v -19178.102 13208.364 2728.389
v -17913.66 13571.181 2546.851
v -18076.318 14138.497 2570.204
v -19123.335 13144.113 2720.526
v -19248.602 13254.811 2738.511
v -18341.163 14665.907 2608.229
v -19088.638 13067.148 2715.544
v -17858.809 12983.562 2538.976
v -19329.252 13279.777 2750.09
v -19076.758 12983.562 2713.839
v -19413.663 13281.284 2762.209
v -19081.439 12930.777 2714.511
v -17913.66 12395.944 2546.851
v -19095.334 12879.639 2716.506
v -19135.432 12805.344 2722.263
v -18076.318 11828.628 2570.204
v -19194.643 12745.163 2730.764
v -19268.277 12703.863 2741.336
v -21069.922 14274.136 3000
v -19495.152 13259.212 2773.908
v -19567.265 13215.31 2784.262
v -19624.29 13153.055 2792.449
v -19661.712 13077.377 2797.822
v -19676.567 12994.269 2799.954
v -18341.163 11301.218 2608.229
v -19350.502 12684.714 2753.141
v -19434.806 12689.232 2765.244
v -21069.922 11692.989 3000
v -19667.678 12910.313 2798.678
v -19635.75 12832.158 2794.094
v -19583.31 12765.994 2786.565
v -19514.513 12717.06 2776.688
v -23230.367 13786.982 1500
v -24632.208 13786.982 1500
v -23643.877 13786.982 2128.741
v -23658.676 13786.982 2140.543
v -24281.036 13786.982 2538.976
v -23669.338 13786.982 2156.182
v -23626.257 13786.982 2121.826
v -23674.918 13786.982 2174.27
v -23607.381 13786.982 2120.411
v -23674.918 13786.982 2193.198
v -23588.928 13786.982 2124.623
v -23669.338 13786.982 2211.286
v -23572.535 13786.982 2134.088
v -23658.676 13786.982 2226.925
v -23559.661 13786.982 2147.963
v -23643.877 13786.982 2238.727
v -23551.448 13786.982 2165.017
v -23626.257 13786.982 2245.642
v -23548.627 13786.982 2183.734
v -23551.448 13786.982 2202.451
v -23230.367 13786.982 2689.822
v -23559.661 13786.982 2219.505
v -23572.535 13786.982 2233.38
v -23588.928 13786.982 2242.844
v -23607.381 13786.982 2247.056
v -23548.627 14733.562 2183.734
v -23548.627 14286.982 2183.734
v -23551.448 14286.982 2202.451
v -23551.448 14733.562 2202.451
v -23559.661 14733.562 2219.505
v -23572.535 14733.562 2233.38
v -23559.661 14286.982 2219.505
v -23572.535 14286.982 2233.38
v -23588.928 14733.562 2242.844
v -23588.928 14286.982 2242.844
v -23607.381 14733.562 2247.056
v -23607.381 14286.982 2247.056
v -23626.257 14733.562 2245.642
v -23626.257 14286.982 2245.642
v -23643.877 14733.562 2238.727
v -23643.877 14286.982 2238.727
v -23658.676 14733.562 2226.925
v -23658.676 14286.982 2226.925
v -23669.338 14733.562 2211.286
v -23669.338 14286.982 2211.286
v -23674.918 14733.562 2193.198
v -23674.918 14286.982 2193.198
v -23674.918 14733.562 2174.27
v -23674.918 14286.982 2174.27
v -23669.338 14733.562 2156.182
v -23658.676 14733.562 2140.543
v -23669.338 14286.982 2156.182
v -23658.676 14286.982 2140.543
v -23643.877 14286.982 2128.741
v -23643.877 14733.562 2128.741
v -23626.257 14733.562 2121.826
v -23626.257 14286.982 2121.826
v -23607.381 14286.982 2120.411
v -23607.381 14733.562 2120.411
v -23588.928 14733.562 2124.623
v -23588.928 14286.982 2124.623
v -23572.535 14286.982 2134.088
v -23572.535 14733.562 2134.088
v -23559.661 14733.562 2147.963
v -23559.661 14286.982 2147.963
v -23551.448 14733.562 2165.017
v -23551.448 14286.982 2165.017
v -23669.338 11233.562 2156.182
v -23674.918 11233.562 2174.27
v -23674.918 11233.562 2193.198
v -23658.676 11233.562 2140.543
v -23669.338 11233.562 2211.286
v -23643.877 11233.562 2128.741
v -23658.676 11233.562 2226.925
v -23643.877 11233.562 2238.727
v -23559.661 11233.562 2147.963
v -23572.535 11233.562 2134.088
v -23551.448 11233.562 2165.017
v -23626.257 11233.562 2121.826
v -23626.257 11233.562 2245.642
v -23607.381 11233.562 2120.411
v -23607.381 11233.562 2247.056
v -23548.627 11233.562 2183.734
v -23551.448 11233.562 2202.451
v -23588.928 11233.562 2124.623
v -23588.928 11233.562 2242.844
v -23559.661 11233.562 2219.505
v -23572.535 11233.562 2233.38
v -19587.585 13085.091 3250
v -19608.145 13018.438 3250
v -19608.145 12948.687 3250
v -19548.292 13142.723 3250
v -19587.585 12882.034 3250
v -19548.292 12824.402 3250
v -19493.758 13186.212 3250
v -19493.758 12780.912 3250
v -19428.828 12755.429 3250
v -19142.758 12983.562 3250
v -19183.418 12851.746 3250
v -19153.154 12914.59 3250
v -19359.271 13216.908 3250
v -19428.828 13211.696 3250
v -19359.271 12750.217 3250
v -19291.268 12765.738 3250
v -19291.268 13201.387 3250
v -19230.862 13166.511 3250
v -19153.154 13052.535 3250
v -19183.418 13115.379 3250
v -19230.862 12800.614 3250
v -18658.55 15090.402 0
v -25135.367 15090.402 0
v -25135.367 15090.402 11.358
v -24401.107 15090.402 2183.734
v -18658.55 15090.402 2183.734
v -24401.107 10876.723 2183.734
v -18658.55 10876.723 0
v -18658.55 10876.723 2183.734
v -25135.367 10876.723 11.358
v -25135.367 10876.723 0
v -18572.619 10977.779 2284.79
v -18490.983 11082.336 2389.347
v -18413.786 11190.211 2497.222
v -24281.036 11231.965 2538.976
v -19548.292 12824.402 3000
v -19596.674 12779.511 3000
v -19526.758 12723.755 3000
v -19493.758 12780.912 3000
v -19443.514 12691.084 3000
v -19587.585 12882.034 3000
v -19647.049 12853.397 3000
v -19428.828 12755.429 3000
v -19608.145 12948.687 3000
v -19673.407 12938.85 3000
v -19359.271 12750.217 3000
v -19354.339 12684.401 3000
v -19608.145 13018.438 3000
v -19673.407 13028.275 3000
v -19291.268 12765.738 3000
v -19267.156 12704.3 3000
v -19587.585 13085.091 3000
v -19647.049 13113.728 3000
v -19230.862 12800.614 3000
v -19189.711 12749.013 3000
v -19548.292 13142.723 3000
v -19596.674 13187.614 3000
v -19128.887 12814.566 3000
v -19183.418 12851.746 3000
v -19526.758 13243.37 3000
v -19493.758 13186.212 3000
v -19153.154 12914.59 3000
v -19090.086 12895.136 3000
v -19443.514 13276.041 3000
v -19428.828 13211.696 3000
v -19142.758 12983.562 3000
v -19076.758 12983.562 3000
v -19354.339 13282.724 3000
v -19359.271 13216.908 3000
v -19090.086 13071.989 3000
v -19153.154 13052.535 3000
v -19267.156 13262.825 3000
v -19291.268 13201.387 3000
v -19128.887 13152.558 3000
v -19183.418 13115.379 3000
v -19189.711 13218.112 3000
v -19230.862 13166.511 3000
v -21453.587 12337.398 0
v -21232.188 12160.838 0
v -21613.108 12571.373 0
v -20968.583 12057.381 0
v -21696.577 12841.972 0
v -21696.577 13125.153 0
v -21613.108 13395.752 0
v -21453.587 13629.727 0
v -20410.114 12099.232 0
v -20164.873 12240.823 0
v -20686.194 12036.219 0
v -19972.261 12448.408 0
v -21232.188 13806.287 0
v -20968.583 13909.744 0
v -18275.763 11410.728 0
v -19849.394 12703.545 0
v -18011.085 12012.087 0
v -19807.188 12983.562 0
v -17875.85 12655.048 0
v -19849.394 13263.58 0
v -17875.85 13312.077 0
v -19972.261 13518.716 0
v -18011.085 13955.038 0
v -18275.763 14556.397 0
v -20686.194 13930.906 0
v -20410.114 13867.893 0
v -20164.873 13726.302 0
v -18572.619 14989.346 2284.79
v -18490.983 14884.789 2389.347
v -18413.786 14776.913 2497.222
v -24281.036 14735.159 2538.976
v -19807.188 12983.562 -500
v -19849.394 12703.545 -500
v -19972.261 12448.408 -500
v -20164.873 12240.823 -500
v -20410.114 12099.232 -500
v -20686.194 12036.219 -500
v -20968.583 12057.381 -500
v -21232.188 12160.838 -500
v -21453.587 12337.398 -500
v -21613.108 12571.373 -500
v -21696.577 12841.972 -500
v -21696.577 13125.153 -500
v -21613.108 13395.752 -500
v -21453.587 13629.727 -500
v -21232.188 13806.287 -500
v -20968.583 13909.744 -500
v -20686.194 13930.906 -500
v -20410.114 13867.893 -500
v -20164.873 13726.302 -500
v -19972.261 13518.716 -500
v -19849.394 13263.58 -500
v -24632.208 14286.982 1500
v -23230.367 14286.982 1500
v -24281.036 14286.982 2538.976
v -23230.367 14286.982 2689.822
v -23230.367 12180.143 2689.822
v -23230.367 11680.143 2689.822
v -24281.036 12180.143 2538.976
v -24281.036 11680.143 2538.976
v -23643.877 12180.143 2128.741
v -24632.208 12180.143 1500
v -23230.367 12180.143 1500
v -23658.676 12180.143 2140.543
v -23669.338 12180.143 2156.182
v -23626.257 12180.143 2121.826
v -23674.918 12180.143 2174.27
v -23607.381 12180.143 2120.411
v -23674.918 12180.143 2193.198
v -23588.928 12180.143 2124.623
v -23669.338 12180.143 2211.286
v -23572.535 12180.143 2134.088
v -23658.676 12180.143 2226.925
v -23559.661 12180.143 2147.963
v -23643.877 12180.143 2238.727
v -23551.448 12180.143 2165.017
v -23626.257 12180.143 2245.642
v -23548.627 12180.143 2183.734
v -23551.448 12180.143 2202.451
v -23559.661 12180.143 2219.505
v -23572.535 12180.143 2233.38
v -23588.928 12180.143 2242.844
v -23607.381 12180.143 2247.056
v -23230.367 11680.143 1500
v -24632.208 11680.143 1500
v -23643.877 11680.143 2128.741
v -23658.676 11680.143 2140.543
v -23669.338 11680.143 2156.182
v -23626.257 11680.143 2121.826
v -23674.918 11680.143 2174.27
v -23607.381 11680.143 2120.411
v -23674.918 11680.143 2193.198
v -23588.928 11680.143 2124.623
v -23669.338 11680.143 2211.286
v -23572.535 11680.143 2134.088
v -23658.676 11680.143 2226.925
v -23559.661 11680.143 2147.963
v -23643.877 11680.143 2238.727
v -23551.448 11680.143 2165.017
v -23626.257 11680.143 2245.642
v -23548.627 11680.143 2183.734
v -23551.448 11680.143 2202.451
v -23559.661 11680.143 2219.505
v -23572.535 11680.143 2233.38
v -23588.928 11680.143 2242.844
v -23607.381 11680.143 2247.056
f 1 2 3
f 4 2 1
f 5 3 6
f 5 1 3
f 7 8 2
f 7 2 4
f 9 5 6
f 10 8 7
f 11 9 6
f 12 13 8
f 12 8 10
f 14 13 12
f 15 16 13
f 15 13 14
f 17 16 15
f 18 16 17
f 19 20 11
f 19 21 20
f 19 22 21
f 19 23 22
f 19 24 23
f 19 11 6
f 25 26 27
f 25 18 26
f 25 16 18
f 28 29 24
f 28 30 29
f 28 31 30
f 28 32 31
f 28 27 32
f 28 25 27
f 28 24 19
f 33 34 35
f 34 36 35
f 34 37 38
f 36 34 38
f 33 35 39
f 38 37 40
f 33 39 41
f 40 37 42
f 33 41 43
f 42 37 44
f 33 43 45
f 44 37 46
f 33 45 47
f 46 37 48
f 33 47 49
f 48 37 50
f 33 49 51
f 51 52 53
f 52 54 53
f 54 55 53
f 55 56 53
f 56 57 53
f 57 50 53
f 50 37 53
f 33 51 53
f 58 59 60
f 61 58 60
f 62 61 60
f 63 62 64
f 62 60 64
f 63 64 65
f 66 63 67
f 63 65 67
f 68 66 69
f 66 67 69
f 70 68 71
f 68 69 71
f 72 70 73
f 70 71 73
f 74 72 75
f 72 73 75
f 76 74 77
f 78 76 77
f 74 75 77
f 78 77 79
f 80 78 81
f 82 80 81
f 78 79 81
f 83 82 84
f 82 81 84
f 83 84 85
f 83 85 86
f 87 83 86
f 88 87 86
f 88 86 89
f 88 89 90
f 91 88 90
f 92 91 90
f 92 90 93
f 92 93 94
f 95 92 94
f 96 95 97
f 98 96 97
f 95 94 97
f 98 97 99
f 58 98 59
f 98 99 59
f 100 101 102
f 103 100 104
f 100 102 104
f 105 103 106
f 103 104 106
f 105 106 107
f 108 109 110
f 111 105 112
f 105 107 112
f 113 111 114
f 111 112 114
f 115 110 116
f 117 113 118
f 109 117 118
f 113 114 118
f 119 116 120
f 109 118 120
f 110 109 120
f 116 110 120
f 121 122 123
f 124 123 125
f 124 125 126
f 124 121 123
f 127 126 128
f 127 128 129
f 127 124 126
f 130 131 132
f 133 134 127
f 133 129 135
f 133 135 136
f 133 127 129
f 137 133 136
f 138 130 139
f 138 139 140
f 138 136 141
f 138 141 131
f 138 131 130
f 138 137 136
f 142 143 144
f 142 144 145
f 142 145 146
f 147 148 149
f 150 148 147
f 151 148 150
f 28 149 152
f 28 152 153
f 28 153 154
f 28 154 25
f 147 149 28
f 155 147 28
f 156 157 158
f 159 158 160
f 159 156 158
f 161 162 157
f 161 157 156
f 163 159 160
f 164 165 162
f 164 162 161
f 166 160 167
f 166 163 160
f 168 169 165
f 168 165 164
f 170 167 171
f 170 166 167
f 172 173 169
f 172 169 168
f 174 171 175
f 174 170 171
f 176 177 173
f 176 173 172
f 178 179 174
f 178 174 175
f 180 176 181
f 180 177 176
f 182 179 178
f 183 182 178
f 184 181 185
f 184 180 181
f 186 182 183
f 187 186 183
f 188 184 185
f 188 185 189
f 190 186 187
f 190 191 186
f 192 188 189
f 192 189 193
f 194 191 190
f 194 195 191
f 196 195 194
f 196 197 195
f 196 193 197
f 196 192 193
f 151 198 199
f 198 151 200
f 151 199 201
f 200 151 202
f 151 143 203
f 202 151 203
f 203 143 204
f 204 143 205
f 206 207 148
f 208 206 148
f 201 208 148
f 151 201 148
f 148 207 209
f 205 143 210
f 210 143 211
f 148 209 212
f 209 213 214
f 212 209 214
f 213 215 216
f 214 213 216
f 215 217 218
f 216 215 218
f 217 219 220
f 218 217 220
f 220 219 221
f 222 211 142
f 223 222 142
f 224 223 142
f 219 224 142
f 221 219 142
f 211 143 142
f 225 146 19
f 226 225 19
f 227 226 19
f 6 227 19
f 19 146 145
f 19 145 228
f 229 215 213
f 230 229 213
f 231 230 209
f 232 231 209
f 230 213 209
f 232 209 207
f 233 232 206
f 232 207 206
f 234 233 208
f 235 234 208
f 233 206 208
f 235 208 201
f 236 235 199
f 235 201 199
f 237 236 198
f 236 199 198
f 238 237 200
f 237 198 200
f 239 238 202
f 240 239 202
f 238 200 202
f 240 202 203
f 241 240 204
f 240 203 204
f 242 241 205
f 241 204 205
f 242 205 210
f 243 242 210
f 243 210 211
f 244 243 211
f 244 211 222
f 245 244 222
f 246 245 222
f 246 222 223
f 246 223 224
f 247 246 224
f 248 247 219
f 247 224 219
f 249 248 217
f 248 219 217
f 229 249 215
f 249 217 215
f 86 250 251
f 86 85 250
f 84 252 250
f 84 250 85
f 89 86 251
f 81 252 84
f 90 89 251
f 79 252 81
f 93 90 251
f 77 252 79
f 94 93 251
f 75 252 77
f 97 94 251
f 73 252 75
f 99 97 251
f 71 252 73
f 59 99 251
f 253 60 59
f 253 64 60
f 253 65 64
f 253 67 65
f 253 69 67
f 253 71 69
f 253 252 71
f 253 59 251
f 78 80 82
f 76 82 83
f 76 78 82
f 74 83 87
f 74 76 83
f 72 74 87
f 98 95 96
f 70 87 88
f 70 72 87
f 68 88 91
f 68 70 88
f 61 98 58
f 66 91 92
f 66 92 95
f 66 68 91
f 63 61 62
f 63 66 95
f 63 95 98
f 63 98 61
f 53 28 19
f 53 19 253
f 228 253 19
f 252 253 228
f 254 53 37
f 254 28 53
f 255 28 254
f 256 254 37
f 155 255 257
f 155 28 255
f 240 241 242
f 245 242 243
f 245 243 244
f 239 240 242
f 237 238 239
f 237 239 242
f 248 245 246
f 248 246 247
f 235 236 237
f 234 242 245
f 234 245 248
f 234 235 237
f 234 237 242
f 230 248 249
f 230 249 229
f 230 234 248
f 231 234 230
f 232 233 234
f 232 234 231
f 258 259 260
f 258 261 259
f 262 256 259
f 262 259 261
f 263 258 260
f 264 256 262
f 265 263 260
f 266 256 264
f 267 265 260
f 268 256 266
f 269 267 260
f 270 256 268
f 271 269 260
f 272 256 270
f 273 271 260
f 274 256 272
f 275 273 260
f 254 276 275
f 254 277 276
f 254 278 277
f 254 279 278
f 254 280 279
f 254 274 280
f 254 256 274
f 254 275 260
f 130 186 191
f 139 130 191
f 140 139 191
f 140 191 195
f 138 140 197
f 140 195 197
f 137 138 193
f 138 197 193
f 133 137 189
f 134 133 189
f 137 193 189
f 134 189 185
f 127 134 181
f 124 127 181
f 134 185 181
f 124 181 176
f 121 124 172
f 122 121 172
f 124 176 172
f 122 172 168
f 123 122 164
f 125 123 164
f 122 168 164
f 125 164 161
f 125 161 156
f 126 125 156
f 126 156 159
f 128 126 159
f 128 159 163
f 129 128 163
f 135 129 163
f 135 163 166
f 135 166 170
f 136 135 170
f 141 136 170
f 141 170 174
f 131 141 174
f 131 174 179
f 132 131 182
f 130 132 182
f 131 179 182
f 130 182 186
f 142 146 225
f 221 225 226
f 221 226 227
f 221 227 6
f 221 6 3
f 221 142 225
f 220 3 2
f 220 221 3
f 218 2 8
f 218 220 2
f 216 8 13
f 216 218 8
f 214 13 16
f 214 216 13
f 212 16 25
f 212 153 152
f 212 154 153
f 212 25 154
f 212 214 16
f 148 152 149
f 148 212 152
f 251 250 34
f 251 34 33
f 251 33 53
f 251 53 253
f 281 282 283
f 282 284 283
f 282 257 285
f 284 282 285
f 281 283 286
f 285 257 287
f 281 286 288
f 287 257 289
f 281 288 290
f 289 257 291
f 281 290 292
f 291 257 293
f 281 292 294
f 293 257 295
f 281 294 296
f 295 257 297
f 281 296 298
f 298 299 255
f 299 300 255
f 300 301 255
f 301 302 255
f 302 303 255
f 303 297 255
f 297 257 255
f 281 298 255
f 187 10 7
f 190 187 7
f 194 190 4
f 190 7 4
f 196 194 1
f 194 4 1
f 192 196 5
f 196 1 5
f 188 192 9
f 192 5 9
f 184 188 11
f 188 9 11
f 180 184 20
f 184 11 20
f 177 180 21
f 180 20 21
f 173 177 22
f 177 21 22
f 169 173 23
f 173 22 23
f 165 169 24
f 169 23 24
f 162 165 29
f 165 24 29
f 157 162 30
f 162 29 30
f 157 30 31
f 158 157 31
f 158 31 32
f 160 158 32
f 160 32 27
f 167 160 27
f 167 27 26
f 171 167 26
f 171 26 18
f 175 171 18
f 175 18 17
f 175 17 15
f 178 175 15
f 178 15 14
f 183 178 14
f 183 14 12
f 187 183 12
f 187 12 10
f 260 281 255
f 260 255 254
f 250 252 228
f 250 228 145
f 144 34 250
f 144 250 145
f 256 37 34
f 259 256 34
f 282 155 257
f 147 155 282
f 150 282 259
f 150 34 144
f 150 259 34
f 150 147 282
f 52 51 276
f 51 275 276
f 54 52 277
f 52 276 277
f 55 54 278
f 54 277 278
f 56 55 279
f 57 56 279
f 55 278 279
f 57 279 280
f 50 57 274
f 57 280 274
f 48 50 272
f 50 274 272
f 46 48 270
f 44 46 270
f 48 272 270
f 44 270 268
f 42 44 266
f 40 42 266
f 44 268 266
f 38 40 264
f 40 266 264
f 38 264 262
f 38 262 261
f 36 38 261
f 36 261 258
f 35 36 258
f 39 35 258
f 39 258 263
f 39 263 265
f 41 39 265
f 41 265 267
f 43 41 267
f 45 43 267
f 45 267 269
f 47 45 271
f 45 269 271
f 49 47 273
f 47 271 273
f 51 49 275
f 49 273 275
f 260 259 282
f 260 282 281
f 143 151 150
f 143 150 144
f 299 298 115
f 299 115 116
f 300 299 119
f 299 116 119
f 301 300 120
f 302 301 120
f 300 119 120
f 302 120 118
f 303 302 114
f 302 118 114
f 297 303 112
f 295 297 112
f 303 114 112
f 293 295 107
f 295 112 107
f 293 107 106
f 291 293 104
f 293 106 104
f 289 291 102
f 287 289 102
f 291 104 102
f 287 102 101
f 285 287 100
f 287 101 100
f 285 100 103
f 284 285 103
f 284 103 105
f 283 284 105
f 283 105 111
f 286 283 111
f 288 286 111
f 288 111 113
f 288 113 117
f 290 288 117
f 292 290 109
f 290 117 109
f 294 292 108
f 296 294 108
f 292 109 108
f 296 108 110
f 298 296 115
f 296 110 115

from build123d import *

# Parameters (mm, degrees)
BOSS_EXTRUDE1_DEPTH     = 3000
CUT_EXTRUDE1_DEPTH      = 25402.288510932
CUT_EXTRUDE1_DEPTH_BACK = 25402.288510932
CUT_EXTRUDE2_DEPTH      = 15914.769996038
CUT_EXTRUDE2_DEPTH_BACK = 15914.769996038
CUT_EXTRUDE3_START      = 3000
SKETCH4_W               = 1905
SKETCH4_H               = 500
CUT_EXTRUDE3_DEPTH      = 1500
SKETCH5_R               = 300
BOSS_EXTRUDE2_DEPTH     = 3000
SKETCH6_R               = 234
BOSS_EXTRUDE3_DEPTH     = 250
SKETCH7_R               = 63.5
CUT_EXTRUDE4_DEPTH      = 1750
SKETCH8_R               = 950
BOSS_EXTRUDE4_DEPTH     = 500


with BuildPart() as part:
    # Sketch1 → Boss-Extrude1 (new body)
    with BuildSketch(Plane.XY):
        with BuildLine():
            Line((-18658.550312437, 10876.722883323), (-25135.367216267, 10876.722883323))
            Line((-25135.367216267, 10876.722883323), (-25135.367216267, 15090.401997377))
            Line((-25135.367216267, 15090.401997377), (-18658.550312437, 15090.401997377))
            ThreePointArc((-18658.550312437, 15090.401997377), (-17858.808631219, 12983.56244035), (-18658.550312437, 10876.722883323))
        make_face()
    extrude(amount=BOSS_EXTRUDE1_DEPTH)

    # Sketch2 → Cut-Extrude1 (cut, two sides: drawn at the far end of the back side and taken through both)
    with BuildSketch(Plane(origin=(0, 12983.56244035, 0), x_dir=(1, 0, 0), z_dir=(0, 1, 0)).offset(-CUT_EXTRUDE1_DEPTH_BACK)):
        Polygon((-17858.808631219, -2538.97640876), (-21069.922216717, -3000), (-17858.808631219, -3000), align=None)
        Polygon((-24281.035802216, -2538.97640876), (-25139.206187576, 0), (-25135.367216266, -3000), (-21069.922216717, -3000), align=None)
    extrude(amount=CUT_EXTRUDE1_DEPTH + CUT_EXTRUDE1_DEPTH_BACK, mode=Mode.SUBTRACT)

    # Sketch3 → Cut-Extrude2 (cut, two sides: drawn at the far end of the back side and taken through both)
    with BuildSketch(Plane(origin=(-21069.922216718, 0, 0), x_dir=(0, 0, -1), z_dir=(1, 0, 0)).offset(-CUT_EXTRUDE2_DEPTH_BACK)):
        Polygon((-2183.733894313, 15090.401997377), (-3000, 14274.13589169), (-3000, 15090.401997377), align=None)
        Polygon((-3000, 11692.98898901), (-3000, 10876.722883323), (-2183.733894313, 10876.722883323), align=None)
    extrude(amount=CUT_EXTRUDE2_DEPTH + CUT_EXTRUDE2_DEPTH_BACK, mode=Mode.SUBTRACT)

    # Sketch4 → Cut-Extrude3 (cut)
    with BuildSketch(Plane.XY.offset(CUT_EXTRUDE3_START)):
        with Locations((-24182.867216267, 14036.982218863)):
            Rectangle(SKETCH4_W, SKETCH4_H)
        with Locations((-24182.867216267, 11930.142661836)):
            Rectangle(SKETCH4_W, SKETCH4_H)
    extrude(amount=-CUT_EXTRUDE3_DEPTH, mode=Mode.SUBTRACT)

    # Sketch5 → Boss-Extrude2 (add)
    with BuildSketch(Plane.XY):
        with Locations((-19376.758216718, 12983.56244035)):
            Circle(SKETCH5_R)
    extrude(amount=BOSS_EXTRUDE2_DEPTH)

    # Sketch6 → Boss-Extrude3 (add)
    with BuildSketch(Plane.XY.offset(3000)):
        with Locations((-19376.758216718, 12983.56244035)):
            Circle(SKETCH6_R)
    extrude(amount=BOSS_EXTRUDE3_DEPTH)

    # Sketch7 → Cut-Extrude4 (cut, symmetric)
    with BuildSketch(Plane(origin=(0, 12983.56244035, 0), x_dir=(-1, 0, 0), z_dir=(0, -1, 0))):
        with Locations(Location((23612.126841123, -2183.733894313, 0), (0, 0, 180))):
            Circle(SKETCH7_R)
    extrude(amount=CUT_EXTRUDE4_DEPTH, both=True, mode=Mode.SUBTRACT)

    # Sketch8 → Boss-Extrude4 (add)
    with BuildSketch(Plane(origin=(0, 0, 0), x_dir=(-1, 0, 0), z_dir=(0, 0, -1))):
        with Locations(Location((20757.187947729, 12983.56244035, 0), (0, 0, 180))):
            Circle(SKETCH8_R)
    extrude(amount=BOSS_EXTRUDE4_DEPTH)


solid = part.part
